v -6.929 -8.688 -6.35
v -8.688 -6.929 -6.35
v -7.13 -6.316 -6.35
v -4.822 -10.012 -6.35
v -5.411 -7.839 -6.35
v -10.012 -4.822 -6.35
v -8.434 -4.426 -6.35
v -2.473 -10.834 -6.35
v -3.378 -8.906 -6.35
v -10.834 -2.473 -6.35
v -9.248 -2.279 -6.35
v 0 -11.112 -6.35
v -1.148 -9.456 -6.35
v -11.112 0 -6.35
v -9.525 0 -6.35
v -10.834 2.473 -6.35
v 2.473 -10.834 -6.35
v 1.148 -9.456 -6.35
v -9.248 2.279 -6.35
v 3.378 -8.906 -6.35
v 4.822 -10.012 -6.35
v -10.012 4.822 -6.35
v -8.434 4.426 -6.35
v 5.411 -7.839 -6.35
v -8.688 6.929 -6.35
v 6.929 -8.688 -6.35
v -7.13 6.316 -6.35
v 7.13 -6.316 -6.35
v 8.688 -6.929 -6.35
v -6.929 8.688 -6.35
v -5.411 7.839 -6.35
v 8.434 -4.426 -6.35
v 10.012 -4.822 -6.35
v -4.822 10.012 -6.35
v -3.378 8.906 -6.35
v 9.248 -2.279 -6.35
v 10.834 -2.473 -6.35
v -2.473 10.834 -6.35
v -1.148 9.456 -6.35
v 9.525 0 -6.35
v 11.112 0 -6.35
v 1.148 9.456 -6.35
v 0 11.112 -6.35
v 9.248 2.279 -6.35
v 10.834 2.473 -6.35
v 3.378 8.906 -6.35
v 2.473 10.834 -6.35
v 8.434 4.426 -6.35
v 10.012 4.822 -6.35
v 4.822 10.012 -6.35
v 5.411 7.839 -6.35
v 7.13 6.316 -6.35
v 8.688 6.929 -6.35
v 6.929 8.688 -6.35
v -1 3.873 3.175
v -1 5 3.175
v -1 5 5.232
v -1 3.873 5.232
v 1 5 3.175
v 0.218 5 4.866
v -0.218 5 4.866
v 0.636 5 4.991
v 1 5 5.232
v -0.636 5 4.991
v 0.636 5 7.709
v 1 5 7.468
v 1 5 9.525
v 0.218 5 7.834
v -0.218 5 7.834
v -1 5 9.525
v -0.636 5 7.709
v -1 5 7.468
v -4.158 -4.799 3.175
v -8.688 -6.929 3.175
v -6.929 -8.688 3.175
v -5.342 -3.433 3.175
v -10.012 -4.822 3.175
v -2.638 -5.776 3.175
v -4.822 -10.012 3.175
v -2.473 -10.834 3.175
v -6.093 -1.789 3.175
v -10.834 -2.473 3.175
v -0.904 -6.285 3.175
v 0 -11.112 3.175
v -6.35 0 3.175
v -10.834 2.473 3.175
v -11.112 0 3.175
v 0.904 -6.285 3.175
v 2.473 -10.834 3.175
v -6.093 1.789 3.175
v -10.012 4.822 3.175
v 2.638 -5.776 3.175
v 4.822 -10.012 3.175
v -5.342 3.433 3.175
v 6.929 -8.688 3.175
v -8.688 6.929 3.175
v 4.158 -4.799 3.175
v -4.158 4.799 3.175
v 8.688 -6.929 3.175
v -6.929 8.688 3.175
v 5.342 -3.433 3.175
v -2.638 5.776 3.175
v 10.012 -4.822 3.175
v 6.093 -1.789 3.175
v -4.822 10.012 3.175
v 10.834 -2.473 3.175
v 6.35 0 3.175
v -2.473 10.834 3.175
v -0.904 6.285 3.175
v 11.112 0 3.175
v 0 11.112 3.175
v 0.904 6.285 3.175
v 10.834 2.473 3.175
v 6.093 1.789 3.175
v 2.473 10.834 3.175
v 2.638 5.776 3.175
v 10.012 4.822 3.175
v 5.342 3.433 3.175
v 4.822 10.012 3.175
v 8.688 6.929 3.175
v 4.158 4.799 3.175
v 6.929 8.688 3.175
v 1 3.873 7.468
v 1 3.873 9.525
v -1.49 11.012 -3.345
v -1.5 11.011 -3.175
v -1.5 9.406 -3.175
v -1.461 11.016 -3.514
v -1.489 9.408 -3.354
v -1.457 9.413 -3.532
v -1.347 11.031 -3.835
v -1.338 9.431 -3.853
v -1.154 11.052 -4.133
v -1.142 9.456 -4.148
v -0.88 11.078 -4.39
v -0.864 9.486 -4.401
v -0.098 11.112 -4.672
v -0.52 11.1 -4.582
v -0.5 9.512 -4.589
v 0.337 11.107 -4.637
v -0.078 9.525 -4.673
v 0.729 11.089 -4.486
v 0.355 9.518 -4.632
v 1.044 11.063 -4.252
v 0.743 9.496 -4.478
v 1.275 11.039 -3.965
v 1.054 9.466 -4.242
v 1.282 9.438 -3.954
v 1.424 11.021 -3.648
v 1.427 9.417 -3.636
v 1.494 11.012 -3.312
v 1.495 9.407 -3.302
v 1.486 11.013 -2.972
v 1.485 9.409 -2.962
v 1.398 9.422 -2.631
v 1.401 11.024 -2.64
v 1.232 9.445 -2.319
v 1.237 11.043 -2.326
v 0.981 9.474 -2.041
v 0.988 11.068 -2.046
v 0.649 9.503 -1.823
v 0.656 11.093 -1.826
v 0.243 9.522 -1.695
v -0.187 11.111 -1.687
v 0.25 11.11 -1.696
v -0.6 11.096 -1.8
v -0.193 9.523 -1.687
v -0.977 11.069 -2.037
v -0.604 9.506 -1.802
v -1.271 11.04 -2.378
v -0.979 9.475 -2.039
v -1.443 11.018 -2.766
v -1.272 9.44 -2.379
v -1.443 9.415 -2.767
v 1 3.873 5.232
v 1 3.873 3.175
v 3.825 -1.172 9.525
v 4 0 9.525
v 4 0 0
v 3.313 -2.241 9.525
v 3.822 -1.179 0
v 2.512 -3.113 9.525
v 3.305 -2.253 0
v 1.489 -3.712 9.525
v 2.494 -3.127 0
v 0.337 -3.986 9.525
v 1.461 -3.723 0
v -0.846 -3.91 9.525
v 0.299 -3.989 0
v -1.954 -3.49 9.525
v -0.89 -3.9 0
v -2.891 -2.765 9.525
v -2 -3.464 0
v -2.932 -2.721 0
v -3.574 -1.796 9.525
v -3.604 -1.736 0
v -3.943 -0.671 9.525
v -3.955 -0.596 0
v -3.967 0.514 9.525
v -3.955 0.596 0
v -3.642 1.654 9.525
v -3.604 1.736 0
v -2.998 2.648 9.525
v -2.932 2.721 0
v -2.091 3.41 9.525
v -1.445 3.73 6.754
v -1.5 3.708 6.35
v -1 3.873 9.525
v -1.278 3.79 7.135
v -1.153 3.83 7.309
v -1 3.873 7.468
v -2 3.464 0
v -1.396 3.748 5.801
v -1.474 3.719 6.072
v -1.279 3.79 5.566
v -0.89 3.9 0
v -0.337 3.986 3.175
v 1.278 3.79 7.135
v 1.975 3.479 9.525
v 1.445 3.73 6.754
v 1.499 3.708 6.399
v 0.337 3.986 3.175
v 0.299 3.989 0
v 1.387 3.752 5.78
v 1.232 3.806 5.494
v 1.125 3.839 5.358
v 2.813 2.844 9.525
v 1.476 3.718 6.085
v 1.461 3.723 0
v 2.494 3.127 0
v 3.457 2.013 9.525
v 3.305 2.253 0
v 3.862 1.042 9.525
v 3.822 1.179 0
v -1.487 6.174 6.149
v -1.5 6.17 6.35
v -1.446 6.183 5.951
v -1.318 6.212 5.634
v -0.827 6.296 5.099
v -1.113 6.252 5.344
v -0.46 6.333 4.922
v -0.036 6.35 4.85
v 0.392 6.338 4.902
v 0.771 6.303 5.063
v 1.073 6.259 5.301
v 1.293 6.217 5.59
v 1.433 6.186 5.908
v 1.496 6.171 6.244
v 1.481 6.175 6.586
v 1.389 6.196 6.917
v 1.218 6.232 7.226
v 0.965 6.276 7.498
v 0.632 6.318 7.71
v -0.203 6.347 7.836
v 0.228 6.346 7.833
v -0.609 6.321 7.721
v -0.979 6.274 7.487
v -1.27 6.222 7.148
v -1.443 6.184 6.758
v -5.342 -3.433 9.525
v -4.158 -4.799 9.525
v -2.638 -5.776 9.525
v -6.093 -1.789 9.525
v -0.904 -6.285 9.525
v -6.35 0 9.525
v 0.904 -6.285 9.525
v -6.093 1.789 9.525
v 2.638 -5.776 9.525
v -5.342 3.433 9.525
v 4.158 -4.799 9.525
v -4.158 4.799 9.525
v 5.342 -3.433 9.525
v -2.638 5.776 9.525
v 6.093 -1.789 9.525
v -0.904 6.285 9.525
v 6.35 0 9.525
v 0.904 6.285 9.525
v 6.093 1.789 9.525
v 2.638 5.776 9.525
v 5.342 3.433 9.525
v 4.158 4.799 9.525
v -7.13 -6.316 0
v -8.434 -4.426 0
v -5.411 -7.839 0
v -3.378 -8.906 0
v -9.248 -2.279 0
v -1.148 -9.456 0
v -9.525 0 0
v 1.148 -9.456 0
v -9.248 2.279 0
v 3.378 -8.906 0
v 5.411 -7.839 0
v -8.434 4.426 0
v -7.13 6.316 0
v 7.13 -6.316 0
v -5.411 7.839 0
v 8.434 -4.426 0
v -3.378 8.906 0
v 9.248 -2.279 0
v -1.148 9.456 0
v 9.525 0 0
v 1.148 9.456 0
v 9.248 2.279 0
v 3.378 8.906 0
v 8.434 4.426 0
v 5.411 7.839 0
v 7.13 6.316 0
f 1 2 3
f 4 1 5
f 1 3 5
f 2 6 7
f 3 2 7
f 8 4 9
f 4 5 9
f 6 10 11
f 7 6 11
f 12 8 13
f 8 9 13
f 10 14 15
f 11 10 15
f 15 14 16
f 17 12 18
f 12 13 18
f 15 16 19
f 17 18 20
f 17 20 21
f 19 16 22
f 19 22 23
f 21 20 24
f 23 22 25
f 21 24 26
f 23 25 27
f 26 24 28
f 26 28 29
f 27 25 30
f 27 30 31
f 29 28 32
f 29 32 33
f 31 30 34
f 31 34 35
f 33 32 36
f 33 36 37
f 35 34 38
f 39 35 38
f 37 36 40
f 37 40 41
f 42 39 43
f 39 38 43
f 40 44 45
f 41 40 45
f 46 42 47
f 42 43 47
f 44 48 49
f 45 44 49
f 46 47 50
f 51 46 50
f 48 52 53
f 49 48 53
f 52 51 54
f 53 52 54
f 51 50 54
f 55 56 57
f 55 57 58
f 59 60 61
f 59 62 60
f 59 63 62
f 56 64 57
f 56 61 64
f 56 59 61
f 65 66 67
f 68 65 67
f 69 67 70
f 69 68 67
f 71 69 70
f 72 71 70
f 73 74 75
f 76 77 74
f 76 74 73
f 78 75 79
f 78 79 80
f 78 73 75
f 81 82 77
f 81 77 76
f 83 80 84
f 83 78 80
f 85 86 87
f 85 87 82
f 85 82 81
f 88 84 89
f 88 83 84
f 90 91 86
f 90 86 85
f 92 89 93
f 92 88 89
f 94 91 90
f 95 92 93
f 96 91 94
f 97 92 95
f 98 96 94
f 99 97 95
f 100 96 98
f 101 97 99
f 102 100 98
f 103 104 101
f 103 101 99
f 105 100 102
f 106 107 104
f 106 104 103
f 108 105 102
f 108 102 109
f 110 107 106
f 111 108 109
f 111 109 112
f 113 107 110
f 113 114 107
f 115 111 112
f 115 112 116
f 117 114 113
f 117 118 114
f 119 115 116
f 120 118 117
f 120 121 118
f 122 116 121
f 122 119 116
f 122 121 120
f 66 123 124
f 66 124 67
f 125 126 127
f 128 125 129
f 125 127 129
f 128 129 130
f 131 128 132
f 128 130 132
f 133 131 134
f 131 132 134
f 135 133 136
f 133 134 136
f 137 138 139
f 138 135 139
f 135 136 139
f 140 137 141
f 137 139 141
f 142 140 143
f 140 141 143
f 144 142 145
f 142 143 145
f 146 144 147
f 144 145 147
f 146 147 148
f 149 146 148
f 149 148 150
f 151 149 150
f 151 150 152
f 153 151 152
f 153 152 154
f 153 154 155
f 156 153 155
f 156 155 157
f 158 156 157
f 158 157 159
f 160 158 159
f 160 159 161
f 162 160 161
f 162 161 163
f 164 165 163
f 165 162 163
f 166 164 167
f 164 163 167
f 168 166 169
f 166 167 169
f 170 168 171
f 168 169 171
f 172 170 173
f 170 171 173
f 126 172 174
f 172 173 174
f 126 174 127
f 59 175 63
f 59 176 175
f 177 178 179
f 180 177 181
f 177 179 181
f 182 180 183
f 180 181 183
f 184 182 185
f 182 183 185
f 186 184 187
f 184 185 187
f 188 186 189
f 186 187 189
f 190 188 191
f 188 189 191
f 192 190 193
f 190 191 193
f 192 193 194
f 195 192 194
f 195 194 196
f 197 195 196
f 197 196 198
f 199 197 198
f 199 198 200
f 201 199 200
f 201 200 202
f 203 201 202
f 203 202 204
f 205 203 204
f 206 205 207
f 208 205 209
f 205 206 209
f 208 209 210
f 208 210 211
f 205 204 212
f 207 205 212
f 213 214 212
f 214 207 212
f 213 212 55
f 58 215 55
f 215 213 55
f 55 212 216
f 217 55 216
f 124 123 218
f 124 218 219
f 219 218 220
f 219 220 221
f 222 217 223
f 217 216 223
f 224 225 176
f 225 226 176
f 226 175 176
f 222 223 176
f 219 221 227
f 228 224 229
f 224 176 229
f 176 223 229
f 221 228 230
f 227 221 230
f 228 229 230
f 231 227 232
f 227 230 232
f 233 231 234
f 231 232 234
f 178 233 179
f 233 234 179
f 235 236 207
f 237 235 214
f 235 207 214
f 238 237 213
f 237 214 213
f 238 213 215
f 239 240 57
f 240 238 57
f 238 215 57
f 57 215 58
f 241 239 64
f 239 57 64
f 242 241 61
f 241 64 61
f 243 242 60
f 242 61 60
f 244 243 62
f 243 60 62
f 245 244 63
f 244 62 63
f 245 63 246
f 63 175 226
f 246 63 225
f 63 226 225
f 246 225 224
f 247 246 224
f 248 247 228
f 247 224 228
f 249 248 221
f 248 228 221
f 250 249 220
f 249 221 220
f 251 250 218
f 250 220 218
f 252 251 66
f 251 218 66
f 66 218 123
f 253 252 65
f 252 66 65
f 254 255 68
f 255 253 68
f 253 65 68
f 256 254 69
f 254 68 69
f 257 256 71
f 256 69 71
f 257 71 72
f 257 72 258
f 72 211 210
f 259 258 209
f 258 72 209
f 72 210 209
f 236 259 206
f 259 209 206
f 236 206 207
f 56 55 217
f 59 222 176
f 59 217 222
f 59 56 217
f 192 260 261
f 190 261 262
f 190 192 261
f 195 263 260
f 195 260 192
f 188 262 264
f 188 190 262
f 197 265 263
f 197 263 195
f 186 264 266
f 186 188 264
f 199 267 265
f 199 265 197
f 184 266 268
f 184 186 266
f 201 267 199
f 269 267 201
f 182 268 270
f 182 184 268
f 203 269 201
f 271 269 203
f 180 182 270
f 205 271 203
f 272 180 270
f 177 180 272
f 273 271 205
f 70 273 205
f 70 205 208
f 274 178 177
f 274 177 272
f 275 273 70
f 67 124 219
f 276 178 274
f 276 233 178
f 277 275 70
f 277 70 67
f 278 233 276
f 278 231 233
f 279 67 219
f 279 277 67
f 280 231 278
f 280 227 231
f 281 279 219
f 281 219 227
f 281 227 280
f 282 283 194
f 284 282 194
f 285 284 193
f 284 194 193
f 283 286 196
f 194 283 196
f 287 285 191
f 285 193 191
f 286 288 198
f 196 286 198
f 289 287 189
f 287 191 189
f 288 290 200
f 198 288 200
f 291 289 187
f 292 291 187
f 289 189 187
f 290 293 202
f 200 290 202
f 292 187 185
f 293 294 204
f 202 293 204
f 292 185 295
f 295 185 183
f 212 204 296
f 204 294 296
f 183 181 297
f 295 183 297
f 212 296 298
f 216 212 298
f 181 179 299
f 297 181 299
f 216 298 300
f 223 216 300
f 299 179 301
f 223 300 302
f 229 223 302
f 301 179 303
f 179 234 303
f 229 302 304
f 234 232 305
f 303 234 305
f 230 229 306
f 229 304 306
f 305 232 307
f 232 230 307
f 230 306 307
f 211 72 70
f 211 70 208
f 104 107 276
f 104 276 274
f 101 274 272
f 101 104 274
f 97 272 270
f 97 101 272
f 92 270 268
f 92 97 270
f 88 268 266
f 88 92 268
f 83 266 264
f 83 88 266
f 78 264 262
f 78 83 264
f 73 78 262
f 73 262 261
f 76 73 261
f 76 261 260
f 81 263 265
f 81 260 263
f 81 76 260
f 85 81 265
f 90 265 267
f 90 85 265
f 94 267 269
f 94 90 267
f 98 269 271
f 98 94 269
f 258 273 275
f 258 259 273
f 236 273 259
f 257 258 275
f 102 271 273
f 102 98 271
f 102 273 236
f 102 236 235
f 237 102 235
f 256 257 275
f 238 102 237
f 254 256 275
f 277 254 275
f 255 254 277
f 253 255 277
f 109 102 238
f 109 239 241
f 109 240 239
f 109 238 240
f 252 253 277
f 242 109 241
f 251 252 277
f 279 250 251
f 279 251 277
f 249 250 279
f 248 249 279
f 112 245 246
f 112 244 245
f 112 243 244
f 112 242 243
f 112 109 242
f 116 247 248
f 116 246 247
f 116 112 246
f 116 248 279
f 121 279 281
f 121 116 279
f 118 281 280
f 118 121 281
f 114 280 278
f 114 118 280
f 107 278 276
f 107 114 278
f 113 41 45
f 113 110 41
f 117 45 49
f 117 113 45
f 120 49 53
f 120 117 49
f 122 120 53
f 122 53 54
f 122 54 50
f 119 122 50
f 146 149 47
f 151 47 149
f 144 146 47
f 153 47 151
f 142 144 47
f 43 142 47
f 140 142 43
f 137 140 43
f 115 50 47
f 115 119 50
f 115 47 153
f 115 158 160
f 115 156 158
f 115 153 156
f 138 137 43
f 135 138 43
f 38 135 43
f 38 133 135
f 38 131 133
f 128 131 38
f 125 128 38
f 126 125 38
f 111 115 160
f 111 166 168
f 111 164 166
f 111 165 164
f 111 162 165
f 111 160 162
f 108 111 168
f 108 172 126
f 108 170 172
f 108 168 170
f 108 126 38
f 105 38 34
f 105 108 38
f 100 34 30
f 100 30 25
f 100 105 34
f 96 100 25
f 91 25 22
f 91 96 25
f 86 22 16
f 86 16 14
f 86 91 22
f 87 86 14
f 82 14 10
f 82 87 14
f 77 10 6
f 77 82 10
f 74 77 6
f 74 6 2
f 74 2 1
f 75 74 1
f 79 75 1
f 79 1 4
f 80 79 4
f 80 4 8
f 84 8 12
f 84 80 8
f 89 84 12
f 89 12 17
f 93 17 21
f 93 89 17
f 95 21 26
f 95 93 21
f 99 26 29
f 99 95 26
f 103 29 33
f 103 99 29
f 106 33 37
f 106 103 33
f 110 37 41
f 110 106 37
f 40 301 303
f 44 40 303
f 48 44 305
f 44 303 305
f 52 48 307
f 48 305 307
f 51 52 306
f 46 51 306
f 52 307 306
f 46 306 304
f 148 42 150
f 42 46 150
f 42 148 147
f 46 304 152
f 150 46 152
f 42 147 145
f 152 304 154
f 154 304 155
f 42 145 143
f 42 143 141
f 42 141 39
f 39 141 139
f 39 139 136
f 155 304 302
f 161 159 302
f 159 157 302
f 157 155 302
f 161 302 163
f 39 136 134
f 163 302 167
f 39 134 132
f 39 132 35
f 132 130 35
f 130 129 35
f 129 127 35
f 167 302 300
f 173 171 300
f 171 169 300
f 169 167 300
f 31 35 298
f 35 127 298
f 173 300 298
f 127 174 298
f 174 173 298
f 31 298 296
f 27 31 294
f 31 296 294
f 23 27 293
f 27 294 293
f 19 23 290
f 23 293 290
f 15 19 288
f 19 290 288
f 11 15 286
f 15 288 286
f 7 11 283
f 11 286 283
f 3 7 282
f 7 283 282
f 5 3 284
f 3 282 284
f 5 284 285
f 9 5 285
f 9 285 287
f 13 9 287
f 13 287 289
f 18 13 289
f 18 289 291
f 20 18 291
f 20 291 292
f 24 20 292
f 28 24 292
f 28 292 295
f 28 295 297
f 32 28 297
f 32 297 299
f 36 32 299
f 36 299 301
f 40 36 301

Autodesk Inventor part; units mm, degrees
ref_plane "YZ Plane" through (0, 0, 0) normal (1, 0, 0) x (0, 1, 0)
ref_plane "XZ Plane" through (0, 0, 0) normal (0, 1, 0) x (-1, 0, 0)
ref_plane "XY Plane" through (0, 0, 0) normal (0, 0, 1) x (1, 0, 0)
sketch "Sketch1" plane through (0, 0, 0) normal (0, 0, 1) x (1, 0, 0)
  circle A0 centre (0, 0) radius 9.525
  circle A1 centre (0, 0) radius 11.1125
  circle A2 centre (0, 0) radius 4
  circle A3 centre (0, 0) radius 6.35
  line L0 (-1, 3) -> (1, 3)
  line L1 (1, 3) -> (1, 5)
  line L2 (1, 5) -> (-1, 5)
  line L3 (-1, 5) -> (-1, 3)
  dimension "d0" = 19.05
  dimension "d1" = 22.225
  dimension "d2" = 8
  dimension "d3" = 12.7
  dimension "d15" = 2
  dimension "d16" = 2
  dimension "d17" = 1
  dimension "d18" = 5
extrude "Extrusion1" add sketch "Sketch1" along normal blind 3.175 contours A0 | A1 | A2 L3 L2 L1 | A3
extrude "Extrusion2" add sketch "Sketch1" along normal blind 9.525 contours A3
extrude "Extrusion3" add sketch "Sketch1" against normal blind 6.35 contours A1
sketch "Sketch2" plane through (0, 0, 0) normal (0, 1, 0) x (-1, 0, 0)
  circle A0 centre (0, 6.35) radius 1.5
  circle A1 centre (0, -3.175) radius 1.5
  line L0 (-9.525, 0) -> (9.525, 0) projected
  line L1 (-4, 9.525) -> (4, 9.525) projected
  point P0 (0, 0)
  point P1 (0, 0)
  dimension "d10" = 3
  dimension "d11" = 3.175
  dimension "d12" = 3.175
extrude "Extrusion4" cut sketch "Sketch2" along normal through all
equation "\"d16\" = d15"
equation "\"d17\" = 0.5 * d15"
equation "\"d18\" = 0.5 * d2 + d17"
properties part number "sprocket hub adaptor"
